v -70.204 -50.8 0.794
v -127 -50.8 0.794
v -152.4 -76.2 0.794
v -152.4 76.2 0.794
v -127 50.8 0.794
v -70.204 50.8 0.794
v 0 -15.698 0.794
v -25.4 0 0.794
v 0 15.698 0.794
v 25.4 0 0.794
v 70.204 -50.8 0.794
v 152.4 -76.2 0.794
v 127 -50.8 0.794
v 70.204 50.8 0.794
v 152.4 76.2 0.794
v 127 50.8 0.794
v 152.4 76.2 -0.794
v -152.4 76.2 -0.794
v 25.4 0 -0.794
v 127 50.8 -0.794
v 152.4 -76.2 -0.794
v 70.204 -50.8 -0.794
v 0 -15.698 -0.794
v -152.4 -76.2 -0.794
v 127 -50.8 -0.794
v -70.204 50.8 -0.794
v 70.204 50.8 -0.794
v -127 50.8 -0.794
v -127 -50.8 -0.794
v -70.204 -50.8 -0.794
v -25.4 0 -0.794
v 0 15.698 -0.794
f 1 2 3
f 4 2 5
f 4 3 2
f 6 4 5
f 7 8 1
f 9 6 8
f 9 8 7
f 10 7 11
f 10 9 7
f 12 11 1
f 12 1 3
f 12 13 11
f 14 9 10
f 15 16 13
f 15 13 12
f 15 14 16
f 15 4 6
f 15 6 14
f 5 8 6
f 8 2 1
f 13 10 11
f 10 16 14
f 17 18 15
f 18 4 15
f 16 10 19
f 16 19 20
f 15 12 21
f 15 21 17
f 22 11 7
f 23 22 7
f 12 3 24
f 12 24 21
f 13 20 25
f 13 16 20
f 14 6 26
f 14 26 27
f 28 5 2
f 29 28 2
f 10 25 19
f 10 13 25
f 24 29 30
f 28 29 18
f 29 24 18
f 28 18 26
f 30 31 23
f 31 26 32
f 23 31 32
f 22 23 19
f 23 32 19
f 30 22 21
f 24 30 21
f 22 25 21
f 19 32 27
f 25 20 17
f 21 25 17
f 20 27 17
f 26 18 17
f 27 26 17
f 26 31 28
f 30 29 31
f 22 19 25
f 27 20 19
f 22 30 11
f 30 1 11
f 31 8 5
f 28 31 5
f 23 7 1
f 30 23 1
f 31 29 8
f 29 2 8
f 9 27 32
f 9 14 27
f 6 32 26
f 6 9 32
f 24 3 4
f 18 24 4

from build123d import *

# Parameters (mm, degrees)
SKETCH1_W           = 304.8
SKETCH1_H           = 152.4
BOSS_EXTRUDE1_DEPTH = 0.79375


with BuildPart() as part:
    # Sketch1 → Boss-Extrude1 (new body, symmetric)
    with BuildSketch(Plane.XY):
        Rectangle(SKETCH1_W, SKETCH1_H)
        Polygon((-127, 50.8), (-127, -50.8), (-25.4, 0), align=None, mode=Mode.SUBTRACT)
        Polygon((-70.203873372, 50.8), (70.203873372, 50.8), (0, 15.698063314), align=None, mode=Mode.SUBTRACT)
        Polygon((0, -15.698063314), (-70.203873372, -50.8), (70.203873372, -50.8), align=None, mode=Mode.SUBTRACT)
        Polygon((25.4, 0), (127, 50.8), (127, -50.8), align=None, mode=Mode.SUBTRACT)
    extrude(amount=BOSS_EXTRUDE1_DEPTH, both=True)


solid = part.part
